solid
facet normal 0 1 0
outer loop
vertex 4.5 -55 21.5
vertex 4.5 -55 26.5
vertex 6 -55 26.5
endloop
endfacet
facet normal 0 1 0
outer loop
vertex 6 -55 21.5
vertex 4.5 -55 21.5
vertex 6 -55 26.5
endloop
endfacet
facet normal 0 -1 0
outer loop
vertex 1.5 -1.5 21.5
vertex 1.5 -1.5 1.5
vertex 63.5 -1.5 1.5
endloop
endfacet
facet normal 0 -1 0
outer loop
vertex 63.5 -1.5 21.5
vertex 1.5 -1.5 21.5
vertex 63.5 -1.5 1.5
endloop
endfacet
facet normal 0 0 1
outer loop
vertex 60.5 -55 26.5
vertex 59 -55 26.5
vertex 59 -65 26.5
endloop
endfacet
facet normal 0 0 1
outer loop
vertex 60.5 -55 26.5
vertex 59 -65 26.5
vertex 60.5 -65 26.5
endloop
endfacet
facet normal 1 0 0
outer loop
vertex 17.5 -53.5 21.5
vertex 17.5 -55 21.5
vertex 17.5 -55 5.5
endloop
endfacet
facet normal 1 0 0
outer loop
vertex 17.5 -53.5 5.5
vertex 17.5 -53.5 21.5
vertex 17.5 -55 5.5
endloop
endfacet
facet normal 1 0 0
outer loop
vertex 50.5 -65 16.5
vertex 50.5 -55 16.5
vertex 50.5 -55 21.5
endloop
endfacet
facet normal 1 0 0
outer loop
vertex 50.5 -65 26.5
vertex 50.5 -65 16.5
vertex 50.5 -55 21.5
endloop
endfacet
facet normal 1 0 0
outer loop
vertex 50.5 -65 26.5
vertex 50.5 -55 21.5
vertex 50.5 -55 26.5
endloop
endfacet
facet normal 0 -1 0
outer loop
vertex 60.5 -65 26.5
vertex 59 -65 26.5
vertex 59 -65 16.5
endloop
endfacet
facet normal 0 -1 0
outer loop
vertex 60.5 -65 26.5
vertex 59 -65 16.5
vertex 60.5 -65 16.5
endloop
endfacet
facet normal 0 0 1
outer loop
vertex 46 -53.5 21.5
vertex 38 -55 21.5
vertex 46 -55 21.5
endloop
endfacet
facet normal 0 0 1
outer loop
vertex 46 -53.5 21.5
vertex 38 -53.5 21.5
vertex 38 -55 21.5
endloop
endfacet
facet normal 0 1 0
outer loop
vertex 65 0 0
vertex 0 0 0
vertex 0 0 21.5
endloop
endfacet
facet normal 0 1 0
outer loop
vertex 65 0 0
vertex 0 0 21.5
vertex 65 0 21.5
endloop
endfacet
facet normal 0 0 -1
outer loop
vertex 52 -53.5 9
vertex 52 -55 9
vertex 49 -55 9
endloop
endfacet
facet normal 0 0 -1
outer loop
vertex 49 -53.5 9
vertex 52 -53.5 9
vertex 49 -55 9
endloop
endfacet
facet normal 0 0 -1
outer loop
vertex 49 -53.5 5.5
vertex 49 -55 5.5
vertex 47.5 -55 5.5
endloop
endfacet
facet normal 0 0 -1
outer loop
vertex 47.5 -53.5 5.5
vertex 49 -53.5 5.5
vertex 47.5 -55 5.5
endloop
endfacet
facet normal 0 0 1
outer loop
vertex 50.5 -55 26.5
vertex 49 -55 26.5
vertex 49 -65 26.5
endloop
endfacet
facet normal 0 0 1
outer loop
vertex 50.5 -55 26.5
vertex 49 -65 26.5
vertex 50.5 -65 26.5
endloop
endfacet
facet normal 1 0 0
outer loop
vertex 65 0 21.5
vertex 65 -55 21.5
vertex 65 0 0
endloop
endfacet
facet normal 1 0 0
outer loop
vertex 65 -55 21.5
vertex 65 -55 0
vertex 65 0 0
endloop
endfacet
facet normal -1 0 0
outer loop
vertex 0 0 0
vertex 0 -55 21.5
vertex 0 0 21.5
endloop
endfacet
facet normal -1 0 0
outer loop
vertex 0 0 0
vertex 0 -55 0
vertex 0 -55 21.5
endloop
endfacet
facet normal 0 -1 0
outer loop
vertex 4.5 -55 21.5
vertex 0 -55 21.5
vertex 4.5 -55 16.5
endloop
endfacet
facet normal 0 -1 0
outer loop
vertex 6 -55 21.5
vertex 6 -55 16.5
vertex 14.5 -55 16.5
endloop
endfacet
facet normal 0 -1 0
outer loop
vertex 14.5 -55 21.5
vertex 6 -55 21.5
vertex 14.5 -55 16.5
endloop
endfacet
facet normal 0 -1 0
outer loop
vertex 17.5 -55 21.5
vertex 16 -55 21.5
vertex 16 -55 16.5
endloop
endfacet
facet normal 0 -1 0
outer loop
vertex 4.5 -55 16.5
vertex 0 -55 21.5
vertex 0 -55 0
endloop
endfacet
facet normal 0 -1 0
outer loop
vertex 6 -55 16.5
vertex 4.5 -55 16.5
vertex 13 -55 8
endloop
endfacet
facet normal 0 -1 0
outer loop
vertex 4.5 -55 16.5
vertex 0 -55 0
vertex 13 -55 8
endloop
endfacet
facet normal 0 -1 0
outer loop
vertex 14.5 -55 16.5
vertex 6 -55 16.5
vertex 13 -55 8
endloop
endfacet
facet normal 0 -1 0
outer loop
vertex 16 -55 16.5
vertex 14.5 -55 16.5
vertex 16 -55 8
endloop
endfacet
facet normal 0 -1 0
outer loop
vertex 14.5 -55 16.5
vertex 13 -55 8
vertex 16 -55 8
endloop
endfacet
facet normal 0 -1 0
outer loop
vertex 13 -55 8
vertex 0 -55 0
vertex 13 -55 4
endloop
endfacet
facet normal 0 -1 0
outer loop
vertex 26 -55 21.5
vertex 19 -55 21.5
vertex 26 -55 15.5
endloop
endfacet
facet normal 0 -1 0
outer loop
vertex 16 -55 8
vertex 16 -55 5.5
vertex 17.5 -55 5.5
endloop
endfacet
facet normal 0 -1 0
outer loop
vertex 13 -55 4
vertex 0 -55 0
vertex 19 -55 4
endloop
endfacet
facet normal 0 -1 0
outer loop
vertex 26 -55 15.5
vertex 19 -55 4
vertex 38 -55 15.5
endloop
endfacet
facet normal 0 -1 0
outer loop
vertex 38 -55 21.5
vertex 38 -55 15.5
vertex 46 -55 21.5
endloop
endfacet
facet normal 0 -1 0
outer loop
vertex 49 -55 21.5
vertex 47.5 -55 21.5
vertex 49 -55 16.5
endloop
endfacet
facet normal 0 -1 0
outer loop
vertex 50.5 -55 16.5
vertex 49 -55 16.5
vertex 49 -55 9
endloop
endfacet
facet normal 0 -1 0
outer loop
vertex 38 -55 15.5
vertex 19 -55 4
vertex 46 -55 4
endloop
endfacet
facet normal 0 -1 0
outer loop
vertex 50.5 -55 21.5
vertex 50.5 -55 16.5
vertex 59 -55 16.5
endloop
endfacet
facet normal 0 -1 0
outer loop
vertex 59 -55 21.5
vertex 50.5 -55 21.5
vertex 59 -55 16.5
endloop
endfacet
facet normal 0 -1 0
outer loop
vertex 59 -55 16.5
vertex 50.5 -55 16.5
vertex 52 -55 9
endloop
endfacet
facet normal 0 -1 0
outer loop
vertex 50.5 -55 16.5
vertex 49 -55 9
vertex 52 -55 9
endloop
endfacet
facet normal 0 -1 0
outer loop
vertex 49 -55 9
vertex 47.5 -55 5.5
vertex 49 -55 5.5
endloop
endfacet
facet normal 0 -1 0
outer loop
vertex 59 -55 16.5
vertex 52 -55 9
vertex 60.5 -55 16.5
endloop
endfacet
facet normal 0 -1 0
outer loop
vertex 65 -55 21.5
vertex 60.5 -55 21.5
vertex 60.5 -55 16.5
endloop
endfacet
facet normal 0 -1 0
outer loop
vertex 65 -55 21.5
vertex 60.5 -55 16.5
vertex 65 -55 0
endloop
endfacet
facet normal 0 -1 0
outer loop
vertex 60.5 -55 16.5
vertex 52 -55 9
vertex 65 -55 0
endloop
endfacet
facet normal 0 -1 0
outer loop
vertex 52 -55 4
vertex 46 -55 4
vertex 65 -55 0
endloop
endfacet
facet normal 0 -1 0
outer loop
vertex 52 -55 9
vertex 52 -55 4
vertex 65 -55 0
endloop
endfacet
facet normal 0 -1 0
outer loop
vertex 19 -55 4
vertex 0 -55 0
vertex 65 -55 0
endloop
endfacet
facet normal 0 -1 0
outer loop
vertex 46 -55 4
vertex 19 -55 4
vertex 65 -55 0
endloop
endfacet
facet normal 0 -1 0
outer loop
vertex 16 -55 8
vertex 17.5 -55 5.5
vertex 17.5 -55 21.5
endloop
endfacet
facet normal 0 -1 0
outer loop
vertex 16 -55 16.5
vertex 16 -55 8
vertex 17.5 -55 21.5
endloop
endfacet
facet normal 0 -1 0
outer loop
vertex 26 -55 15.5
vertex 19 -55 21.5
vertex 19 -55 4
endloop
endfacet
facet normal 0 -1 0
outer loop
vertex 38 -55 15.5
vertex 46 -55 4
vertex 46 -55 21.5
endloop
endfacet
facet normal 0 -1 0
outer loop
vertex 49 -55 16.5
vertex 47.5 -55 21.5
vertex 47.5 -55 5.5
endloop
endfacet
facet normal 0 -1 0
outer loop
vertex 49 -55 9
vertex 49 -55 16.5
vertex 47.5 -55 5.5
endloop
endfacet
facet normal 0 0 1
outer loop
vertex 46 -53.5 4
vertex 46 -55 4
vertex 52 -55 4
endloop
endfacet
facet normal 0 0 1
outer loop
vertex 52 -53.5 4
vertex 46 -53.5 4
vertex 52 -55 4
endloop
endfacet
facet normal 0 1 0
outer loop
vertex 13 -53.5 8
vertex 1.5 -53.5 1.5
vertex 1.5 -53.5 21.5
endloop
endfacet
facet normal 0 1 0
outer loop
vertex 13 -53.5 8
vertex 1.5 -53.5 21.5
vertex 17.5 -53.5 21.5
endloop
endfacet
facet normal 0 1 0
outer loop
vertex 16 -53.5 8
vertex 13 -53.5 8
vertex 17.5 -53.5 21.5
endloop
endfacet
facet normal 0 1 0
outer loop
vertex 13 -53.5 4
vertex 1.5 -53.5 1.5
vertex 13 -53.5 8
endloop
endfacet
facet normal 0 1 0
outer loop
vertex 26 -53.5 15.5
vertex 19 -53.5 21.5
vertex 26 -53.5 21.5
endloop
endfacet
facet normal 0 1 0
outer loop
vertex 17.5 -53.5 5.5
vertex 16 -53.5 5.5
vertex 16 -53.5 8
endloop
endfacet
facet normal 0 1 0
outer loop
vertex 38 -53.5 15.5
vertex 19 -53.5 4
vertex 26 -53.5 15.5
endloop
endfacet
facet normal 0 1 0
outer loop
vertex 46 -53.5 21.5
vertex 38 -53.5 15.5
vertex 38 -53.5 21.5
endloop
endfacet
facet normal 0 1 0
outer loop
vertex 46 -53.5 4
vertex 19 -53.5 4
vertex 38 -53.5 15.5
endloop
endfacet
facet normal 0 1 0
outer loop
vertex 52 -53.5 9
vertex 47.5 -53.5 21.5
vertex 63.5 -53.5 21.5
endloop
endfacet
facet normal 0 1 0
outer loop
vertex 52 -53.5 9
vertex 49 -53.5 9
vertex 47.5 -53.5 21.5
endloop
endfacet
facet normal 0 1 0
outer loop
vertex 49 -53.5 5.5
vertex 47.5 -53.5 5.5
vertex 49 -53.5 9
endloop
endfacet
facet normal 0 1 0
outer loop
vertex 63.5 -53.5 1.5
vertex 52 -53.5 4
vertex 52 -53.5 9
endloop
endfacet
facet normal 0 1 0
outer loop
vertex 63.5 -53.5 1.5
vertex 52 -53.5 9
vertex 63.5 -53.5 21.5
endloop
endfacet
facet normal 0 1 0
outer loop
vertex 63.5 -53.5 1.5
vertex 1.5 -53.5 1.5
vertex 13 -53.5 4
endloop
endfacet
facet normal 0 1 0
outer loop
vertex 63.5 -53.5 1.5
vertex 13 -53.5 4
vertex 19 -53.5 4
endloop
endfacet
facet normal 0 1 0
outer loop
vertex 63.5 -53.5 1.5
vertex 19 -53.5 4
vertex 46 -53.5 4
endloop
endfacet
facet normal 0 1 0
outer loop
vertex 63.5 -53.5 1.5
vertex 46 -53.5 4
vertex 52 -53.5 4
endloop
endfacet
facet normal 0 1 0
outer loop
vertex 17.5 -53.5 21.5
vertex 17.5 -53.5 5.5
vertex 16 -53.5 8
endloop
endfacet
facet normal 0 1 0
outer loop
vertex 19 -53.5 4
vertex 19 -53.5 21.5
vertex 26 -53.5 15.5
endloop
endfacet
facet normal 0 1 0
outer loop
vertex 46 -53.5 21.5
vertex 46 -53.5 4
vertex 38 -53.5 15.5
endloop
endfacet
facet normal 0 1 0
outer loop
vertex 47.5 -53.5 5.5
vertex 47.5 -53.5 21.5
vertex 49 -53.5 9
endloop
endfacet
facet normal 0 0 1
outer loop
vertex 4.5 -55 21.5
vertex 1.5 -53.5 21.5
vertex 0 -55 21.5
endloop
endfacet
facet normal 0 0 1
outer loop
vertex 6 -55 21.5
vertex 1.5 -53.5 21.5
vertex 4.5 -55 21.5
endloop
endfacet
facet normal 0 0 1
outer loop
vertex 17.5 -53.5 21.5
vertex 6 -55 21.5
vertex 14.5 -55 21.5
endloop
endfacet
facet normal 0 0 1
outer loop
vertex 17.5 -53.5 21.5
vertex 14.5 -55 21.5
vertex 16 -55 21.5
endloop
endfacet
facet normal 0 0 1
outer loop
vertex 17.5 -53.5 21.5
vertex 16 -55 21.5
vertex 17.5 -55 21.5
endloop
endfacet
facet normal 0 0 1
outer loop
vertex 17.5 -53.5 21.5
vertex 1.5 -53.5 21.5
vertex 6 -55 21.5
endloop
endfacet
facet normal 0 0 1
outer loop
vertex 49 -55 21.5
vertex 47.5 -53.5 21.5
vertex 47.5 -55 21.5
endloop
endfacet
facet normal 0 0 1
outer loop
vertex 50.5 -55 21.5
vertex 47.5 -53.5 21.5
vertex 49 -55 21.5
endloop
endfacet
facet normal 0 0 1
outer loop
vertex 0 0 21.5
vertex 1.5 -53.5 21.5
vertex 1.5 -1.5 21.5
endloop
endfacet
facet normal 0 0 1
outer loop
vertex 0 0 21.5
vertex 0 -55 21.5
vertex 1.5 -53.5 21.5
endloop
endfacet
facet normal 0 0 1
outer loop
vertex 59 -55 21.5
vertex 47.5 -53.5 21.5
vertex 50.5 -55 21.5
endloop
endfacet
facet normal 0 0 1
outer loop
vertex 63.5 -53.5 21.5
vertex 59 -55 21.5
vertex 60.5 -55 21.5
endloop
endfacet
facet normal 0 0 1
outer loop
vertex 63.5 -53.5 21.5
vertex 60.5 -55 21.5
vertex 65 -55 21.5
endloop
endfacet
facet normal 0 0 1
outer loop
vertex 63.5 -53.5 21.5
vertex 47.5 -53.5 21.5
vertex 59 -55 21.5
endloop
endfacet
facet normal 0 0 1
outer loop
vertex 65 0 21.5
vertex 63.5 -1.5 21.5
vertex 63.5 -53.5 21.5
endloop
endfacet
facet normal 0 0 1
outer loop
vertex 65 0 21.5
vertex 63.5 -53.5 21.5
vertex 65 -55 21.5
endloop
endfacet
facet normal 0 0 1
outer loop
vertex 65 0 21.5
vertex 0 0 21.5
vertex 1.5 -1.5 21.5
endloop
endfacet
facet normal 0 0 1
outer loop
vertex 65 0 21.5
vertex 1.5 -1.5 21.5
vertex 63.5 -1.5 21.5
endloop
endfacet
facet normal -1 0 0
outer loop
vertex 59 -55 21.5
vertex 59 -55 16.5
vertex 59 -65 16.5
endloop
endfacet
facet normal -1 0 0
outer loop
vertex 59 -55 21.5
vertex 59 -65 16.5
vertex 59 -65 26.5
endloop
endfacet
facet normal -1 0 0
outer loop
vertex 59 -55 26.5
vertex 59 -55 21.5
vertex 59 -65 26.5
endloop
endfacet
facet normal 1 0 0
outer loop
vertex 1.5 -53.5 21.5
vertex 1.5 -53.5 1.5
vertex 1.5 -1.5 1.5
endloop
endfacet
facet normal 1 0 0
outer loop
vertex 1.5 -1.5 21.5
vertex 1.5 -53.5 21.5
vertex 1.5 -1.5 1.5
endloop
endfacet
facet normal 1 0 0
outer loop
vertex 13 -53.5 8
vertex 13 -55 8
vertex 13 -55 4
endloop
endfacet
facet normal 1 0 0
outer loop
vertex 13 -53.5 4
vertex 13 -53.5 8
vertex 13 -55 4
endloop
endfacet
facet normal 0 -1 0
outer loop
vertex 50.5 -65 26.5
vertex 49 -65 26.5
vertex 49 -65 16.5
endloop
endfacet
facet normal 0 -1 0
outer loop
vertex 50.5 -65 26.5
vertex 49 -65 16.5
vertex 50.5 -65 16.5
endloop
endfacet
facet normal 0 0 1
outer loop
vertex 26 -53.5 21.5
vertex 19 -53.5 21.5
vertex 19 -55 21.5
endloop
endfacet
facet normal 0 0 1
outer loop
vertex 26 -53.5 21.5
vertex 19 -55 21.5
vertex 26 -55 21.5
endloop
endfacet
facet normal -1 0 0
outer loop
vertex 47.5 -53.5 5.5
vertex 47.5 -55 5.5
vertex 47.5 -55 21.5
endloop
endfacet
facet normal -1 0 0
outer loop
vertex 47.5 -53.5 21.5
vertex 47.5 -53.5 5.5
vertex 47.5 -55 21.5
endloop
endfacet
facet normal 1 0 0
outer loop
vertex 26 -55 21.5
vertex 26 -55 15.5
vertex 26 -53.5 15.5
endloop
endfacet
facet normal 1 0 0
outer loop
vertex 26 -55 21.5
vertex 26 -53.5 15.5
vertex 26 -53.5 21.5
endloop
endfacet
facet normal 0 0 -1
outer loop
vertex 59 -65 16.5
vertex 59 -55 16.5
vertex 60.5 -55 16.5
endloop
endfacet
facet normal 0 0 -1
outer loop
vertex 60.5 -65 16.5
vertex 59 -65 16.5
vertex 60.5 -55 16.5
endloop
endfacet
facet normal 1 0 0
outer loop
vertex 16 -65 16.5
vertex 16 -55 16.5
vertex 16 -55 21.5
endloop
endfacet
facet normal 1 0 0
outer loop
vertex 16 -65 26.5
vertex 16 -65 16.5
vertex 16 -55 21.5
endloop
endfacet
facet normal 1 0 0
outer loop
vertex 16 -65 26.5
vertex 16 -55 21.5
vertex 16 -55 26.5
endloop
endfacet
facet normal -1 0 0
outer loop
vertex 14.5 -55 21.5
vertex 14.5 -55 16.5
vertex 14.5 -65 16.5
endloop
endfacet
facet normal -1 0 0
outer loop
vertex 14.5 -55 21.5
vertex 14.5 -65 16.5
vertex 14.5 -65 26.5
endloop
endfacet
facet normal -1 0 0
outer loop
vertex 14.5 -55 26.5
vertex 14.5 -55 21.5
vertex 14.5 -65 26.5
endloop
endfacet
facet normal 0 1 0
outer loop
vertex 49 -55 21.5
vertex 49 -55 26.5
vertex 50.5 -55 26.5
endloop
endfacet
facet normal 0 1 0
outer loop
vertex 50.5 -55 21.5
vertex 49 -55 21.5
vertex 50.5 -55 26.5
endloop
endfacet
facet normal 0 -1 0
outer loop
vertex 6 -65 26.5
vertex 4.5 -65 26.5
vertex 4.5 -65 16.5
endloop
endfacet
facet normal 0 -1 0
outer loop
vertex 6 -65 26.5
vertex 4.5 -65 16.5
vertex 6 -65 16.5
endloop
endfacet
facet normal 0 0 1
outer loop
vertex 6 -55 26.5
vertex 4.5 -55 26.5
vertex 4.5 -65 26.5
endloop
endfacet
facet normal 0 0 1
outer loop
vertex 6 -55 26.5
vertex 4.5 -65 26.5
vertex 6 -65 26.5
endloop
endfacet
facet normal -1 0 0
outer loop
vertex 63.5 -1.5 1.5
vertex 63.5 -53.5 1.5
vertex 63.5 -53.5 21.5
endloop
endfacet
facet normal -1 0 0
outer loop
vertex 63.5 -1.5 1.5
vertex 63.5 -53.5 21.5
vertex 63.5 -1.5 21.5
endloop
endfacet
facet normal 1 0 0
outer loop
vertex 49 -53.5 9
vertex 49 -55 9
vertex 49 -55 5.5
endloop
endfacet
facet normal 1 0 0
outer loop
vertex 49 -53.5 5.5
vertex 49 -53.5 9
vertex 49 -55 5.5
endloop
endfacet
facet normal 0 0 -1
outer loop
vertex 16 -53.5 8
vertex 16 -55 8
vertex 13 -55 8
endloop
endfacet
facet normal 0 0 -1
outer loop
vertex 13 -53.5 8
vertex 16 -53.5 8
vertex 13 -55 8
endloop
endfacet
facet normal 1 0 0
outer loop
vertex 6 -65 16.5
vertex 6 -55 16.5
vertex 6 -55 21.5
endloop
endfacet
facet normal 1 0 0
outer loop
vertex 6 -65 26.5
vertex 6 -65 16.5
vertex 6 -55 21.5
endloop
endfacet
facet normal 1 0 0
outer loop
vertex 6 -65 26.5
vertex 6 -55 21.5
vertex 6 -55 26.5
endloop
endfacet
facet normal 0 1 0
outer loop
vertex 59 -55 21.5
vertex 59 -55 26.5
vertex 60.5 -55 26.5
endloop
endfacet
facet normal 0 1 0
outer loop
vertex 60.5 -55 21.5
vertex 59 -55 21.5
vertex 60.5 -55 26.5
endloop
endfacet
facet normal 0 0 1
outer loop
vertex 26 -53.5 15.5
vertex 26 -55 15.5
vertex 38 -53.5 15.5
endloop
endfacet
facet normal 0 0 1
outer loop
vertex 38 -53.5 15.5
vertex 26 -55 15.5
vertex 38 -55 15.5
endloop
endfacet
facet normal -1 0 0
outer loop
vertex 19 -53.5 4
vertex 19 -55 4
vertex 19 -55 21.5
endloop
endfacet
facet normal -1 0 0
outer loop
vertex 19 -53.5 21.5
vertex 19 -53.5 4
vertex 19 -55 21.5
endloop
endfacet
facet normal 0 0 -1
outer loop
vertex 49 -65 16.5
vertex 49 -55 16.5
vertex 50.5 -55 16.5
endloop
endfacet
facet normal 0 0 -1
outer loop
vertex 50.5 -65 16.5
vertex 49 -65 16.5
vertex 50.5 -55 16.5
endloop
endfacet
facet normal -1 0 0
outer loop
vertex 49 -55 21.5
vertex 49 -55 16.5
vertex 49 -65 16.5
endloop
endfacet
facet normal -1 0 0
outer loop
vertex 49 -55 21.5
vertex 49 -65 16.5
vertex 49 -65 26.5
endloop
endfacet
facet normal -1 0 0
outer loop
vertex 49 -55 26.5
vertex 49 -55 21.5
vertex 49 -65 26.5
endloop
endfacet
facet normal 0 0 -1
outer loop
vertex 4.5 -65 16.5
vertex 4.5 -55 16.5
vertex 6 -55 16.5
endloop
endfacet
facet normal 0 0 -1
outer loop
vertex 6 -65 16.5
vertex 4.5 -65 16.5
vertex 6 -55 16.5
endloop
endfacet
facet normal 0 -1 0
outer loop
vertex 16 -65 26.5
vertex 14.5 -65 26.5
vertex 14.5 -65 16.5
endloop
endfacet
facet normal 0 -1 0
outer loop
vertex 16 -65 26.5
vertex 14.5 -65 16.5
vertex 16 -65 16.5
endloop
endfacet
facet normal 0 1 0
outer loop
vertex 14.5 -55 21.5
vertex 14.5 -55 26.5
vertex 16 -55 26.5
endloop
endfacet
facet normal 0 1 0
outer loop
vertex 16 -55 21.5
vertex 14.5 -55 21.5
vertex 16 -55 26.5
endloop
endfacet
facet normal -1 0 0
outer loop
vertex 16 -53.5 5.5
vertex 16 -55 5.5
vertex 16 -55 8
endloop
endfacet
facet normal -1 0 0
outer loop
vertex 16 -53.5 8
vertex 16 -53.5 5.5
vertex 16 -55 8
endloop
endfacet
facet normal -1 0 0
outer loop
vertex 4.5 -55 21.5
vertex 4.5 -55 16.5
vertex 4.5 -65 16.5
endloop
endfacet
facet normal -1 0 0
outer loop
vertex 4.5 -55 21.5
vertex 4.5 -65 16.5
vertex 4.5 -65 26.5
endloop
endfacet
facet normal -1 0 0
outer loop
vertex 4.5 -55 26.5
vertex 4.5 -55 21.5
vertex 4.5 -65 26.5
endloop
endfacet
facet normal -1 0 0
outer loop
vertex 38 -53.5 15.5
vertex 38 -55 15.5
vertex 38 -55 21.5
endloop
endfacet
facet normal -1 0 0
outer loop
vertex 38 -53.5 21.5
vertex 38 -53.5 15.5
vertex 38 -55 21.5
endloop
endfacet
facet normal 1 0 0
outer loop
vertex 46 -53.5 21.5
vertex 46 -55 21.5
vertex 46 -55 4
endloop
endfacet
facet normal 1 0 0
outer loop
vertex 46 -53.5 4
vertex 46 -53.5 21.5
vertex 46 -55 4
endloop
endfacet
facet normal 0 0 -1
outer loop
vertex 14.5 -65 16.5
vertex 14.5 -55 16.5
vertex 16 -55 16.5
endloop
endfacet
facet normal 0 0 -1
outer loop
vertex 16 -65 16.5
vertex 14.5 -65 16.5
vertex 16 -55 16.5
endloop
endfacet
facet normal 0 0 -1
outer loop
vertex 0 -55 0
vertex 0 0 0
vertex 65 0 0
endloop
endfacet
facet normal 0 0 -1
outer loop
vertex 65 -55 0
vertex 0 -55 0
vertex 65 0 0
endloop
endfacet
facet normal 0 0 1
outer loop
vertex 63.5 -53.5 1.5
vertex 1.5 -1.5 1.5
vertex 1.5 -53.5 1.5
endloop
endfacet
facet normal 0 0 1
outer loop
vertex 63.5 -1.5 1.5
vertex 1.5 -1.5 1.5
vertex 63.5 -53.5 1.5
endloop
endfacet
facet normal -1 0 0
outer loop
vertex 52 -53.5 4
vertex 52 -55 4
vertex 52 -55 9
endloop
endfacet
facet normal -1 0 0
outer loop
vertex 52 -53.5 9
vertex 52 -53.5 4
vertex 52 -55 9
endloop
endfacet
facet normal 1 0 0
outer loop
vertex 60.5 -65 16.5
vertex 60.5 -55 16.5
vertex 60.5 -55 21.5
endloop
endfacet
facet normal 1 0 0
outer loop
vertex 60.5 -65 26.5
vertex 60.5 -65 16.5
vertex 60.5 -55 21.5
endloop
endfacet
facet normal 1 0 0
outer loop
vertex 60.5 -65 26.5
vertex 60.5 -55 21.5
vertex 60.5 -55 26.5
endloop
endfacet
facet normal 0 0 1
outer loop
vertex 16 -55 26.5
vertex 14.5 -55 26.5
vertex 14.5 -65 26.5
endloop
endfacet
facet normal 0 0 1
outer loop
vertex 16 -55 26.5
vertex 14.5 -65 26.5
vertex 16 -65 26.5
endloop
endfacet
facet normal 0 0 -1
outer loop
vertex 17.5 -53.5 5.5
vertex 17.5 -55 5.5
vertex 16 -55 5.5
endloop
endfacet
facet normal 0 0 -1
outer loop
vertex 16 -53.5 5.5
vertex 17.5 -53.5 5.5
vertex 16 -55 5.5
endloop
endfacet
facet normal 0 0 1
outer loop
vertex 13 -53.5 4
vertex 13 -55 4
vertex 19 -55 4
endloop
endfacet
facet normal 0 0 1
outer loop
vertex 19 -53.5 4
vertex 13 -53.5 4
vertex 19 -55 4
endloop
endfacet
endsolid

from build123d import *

# Parameters (mm, degrees)
SKETCH_1_W          = 65
SKETCH_1_H          = 55
EXTRUDE_1_DEPTH     = 1.5
SKETCH_2_W          = 65
SKETCH_2_H          = 55
SKETCH_2_W_2        = 62
SKETCH_2_H_2        = 52
EXTRUDE_2_DEPTH     = 20
SKETCH_3_W          = 12
SKETCH_3_H          = 6
CUT_EXTRUDE_1_DEPTH = 1.5
CUT_EXTRUDE_2_DEPTH = 1.5
SKETCH_5_W          = 1.5
SKETCH_5_H          = 10
EXTRUDE_3_DEPTH     = 10


with BuildPart() as part:
    # 草图1 → 凸台-拉伸1 (new body)
    with BuildSketch(Plane.XY):
        with Locations((32.5, -27.5)):
            Rectangle(SKETCH_1_W, SKETCH_1_H)
    extrude(amount=EXTRUDE_1_DEPTH)

    # 草图2 → 凸台-拉伸2 (add)
    with BuildSketch(Plane.XY.offset(1.5)):
        with Locations((32.5, -27.5)):
            Rectangle(SKETCH_2_W, SKETCH_2_H)
        with Locations((32.5, -27.5)):
            Rectangle(SKETCH_2_W_2, SKETCH_2_H_2, mode=Mode.SUBTRACT)
    extrude(amount=EXTRUDE_2_DEPTH)

    # 草图3 → 切除-拉伸1 (cut)
    with BuildSketch(Plane.XZ.offset(55)):
        with Locations((32, 18.5)):
            Rectangle(SKETCH_3_W, SKETCH_3_H)
    extrude(amount=-CUT_EXTRUDE_1_DEPTH, mode=Mode.SUBTRACT)

    # 草图4 → 切除-拉伸2 (cut)
    with BuildSketch(Plane.XZ.offset(55)):
        Polygon((19, 21.5), (17.5, 21.5), (17.5, 5.5), (16, 5.5), (16, 8), (13, 8), (13, 4), (19, 4), align=None)
        Polygon((47.5, 5.5), (47.5, 21.5), (46, 21.5), (46, 4), (52, 4), (52, 9), (49, 9), (49, 5.5), align=None)
    extrude(amount=-CUT_EXTRUDE_2_DEPTH, mode=Mode.SUBTRACT)

    # 草图5 → 凸台-拉伸3 (add)
    with BuildSketch(Plane.XZ.offset(55)):
        with Locations((15.25, 21.5)):
            Rectangle(SKETCH_5_W, SKETCH_5_H)
        with Locations((5.25, 21.5)):
            Rectangle(SKETCH_5_W, SKETCH_5_H)
        with Locations((49.75, 21.5)):
            Rectangle(SKETCH_5_W, SKETCH_5_H)
        with Locations((59.75, 21.5)):
            Rectangle(SKETCH_5_W, SKETCH_5_H)
    extrude(amount=EXTRUDE_3_DEPTH)


solid = part.part
